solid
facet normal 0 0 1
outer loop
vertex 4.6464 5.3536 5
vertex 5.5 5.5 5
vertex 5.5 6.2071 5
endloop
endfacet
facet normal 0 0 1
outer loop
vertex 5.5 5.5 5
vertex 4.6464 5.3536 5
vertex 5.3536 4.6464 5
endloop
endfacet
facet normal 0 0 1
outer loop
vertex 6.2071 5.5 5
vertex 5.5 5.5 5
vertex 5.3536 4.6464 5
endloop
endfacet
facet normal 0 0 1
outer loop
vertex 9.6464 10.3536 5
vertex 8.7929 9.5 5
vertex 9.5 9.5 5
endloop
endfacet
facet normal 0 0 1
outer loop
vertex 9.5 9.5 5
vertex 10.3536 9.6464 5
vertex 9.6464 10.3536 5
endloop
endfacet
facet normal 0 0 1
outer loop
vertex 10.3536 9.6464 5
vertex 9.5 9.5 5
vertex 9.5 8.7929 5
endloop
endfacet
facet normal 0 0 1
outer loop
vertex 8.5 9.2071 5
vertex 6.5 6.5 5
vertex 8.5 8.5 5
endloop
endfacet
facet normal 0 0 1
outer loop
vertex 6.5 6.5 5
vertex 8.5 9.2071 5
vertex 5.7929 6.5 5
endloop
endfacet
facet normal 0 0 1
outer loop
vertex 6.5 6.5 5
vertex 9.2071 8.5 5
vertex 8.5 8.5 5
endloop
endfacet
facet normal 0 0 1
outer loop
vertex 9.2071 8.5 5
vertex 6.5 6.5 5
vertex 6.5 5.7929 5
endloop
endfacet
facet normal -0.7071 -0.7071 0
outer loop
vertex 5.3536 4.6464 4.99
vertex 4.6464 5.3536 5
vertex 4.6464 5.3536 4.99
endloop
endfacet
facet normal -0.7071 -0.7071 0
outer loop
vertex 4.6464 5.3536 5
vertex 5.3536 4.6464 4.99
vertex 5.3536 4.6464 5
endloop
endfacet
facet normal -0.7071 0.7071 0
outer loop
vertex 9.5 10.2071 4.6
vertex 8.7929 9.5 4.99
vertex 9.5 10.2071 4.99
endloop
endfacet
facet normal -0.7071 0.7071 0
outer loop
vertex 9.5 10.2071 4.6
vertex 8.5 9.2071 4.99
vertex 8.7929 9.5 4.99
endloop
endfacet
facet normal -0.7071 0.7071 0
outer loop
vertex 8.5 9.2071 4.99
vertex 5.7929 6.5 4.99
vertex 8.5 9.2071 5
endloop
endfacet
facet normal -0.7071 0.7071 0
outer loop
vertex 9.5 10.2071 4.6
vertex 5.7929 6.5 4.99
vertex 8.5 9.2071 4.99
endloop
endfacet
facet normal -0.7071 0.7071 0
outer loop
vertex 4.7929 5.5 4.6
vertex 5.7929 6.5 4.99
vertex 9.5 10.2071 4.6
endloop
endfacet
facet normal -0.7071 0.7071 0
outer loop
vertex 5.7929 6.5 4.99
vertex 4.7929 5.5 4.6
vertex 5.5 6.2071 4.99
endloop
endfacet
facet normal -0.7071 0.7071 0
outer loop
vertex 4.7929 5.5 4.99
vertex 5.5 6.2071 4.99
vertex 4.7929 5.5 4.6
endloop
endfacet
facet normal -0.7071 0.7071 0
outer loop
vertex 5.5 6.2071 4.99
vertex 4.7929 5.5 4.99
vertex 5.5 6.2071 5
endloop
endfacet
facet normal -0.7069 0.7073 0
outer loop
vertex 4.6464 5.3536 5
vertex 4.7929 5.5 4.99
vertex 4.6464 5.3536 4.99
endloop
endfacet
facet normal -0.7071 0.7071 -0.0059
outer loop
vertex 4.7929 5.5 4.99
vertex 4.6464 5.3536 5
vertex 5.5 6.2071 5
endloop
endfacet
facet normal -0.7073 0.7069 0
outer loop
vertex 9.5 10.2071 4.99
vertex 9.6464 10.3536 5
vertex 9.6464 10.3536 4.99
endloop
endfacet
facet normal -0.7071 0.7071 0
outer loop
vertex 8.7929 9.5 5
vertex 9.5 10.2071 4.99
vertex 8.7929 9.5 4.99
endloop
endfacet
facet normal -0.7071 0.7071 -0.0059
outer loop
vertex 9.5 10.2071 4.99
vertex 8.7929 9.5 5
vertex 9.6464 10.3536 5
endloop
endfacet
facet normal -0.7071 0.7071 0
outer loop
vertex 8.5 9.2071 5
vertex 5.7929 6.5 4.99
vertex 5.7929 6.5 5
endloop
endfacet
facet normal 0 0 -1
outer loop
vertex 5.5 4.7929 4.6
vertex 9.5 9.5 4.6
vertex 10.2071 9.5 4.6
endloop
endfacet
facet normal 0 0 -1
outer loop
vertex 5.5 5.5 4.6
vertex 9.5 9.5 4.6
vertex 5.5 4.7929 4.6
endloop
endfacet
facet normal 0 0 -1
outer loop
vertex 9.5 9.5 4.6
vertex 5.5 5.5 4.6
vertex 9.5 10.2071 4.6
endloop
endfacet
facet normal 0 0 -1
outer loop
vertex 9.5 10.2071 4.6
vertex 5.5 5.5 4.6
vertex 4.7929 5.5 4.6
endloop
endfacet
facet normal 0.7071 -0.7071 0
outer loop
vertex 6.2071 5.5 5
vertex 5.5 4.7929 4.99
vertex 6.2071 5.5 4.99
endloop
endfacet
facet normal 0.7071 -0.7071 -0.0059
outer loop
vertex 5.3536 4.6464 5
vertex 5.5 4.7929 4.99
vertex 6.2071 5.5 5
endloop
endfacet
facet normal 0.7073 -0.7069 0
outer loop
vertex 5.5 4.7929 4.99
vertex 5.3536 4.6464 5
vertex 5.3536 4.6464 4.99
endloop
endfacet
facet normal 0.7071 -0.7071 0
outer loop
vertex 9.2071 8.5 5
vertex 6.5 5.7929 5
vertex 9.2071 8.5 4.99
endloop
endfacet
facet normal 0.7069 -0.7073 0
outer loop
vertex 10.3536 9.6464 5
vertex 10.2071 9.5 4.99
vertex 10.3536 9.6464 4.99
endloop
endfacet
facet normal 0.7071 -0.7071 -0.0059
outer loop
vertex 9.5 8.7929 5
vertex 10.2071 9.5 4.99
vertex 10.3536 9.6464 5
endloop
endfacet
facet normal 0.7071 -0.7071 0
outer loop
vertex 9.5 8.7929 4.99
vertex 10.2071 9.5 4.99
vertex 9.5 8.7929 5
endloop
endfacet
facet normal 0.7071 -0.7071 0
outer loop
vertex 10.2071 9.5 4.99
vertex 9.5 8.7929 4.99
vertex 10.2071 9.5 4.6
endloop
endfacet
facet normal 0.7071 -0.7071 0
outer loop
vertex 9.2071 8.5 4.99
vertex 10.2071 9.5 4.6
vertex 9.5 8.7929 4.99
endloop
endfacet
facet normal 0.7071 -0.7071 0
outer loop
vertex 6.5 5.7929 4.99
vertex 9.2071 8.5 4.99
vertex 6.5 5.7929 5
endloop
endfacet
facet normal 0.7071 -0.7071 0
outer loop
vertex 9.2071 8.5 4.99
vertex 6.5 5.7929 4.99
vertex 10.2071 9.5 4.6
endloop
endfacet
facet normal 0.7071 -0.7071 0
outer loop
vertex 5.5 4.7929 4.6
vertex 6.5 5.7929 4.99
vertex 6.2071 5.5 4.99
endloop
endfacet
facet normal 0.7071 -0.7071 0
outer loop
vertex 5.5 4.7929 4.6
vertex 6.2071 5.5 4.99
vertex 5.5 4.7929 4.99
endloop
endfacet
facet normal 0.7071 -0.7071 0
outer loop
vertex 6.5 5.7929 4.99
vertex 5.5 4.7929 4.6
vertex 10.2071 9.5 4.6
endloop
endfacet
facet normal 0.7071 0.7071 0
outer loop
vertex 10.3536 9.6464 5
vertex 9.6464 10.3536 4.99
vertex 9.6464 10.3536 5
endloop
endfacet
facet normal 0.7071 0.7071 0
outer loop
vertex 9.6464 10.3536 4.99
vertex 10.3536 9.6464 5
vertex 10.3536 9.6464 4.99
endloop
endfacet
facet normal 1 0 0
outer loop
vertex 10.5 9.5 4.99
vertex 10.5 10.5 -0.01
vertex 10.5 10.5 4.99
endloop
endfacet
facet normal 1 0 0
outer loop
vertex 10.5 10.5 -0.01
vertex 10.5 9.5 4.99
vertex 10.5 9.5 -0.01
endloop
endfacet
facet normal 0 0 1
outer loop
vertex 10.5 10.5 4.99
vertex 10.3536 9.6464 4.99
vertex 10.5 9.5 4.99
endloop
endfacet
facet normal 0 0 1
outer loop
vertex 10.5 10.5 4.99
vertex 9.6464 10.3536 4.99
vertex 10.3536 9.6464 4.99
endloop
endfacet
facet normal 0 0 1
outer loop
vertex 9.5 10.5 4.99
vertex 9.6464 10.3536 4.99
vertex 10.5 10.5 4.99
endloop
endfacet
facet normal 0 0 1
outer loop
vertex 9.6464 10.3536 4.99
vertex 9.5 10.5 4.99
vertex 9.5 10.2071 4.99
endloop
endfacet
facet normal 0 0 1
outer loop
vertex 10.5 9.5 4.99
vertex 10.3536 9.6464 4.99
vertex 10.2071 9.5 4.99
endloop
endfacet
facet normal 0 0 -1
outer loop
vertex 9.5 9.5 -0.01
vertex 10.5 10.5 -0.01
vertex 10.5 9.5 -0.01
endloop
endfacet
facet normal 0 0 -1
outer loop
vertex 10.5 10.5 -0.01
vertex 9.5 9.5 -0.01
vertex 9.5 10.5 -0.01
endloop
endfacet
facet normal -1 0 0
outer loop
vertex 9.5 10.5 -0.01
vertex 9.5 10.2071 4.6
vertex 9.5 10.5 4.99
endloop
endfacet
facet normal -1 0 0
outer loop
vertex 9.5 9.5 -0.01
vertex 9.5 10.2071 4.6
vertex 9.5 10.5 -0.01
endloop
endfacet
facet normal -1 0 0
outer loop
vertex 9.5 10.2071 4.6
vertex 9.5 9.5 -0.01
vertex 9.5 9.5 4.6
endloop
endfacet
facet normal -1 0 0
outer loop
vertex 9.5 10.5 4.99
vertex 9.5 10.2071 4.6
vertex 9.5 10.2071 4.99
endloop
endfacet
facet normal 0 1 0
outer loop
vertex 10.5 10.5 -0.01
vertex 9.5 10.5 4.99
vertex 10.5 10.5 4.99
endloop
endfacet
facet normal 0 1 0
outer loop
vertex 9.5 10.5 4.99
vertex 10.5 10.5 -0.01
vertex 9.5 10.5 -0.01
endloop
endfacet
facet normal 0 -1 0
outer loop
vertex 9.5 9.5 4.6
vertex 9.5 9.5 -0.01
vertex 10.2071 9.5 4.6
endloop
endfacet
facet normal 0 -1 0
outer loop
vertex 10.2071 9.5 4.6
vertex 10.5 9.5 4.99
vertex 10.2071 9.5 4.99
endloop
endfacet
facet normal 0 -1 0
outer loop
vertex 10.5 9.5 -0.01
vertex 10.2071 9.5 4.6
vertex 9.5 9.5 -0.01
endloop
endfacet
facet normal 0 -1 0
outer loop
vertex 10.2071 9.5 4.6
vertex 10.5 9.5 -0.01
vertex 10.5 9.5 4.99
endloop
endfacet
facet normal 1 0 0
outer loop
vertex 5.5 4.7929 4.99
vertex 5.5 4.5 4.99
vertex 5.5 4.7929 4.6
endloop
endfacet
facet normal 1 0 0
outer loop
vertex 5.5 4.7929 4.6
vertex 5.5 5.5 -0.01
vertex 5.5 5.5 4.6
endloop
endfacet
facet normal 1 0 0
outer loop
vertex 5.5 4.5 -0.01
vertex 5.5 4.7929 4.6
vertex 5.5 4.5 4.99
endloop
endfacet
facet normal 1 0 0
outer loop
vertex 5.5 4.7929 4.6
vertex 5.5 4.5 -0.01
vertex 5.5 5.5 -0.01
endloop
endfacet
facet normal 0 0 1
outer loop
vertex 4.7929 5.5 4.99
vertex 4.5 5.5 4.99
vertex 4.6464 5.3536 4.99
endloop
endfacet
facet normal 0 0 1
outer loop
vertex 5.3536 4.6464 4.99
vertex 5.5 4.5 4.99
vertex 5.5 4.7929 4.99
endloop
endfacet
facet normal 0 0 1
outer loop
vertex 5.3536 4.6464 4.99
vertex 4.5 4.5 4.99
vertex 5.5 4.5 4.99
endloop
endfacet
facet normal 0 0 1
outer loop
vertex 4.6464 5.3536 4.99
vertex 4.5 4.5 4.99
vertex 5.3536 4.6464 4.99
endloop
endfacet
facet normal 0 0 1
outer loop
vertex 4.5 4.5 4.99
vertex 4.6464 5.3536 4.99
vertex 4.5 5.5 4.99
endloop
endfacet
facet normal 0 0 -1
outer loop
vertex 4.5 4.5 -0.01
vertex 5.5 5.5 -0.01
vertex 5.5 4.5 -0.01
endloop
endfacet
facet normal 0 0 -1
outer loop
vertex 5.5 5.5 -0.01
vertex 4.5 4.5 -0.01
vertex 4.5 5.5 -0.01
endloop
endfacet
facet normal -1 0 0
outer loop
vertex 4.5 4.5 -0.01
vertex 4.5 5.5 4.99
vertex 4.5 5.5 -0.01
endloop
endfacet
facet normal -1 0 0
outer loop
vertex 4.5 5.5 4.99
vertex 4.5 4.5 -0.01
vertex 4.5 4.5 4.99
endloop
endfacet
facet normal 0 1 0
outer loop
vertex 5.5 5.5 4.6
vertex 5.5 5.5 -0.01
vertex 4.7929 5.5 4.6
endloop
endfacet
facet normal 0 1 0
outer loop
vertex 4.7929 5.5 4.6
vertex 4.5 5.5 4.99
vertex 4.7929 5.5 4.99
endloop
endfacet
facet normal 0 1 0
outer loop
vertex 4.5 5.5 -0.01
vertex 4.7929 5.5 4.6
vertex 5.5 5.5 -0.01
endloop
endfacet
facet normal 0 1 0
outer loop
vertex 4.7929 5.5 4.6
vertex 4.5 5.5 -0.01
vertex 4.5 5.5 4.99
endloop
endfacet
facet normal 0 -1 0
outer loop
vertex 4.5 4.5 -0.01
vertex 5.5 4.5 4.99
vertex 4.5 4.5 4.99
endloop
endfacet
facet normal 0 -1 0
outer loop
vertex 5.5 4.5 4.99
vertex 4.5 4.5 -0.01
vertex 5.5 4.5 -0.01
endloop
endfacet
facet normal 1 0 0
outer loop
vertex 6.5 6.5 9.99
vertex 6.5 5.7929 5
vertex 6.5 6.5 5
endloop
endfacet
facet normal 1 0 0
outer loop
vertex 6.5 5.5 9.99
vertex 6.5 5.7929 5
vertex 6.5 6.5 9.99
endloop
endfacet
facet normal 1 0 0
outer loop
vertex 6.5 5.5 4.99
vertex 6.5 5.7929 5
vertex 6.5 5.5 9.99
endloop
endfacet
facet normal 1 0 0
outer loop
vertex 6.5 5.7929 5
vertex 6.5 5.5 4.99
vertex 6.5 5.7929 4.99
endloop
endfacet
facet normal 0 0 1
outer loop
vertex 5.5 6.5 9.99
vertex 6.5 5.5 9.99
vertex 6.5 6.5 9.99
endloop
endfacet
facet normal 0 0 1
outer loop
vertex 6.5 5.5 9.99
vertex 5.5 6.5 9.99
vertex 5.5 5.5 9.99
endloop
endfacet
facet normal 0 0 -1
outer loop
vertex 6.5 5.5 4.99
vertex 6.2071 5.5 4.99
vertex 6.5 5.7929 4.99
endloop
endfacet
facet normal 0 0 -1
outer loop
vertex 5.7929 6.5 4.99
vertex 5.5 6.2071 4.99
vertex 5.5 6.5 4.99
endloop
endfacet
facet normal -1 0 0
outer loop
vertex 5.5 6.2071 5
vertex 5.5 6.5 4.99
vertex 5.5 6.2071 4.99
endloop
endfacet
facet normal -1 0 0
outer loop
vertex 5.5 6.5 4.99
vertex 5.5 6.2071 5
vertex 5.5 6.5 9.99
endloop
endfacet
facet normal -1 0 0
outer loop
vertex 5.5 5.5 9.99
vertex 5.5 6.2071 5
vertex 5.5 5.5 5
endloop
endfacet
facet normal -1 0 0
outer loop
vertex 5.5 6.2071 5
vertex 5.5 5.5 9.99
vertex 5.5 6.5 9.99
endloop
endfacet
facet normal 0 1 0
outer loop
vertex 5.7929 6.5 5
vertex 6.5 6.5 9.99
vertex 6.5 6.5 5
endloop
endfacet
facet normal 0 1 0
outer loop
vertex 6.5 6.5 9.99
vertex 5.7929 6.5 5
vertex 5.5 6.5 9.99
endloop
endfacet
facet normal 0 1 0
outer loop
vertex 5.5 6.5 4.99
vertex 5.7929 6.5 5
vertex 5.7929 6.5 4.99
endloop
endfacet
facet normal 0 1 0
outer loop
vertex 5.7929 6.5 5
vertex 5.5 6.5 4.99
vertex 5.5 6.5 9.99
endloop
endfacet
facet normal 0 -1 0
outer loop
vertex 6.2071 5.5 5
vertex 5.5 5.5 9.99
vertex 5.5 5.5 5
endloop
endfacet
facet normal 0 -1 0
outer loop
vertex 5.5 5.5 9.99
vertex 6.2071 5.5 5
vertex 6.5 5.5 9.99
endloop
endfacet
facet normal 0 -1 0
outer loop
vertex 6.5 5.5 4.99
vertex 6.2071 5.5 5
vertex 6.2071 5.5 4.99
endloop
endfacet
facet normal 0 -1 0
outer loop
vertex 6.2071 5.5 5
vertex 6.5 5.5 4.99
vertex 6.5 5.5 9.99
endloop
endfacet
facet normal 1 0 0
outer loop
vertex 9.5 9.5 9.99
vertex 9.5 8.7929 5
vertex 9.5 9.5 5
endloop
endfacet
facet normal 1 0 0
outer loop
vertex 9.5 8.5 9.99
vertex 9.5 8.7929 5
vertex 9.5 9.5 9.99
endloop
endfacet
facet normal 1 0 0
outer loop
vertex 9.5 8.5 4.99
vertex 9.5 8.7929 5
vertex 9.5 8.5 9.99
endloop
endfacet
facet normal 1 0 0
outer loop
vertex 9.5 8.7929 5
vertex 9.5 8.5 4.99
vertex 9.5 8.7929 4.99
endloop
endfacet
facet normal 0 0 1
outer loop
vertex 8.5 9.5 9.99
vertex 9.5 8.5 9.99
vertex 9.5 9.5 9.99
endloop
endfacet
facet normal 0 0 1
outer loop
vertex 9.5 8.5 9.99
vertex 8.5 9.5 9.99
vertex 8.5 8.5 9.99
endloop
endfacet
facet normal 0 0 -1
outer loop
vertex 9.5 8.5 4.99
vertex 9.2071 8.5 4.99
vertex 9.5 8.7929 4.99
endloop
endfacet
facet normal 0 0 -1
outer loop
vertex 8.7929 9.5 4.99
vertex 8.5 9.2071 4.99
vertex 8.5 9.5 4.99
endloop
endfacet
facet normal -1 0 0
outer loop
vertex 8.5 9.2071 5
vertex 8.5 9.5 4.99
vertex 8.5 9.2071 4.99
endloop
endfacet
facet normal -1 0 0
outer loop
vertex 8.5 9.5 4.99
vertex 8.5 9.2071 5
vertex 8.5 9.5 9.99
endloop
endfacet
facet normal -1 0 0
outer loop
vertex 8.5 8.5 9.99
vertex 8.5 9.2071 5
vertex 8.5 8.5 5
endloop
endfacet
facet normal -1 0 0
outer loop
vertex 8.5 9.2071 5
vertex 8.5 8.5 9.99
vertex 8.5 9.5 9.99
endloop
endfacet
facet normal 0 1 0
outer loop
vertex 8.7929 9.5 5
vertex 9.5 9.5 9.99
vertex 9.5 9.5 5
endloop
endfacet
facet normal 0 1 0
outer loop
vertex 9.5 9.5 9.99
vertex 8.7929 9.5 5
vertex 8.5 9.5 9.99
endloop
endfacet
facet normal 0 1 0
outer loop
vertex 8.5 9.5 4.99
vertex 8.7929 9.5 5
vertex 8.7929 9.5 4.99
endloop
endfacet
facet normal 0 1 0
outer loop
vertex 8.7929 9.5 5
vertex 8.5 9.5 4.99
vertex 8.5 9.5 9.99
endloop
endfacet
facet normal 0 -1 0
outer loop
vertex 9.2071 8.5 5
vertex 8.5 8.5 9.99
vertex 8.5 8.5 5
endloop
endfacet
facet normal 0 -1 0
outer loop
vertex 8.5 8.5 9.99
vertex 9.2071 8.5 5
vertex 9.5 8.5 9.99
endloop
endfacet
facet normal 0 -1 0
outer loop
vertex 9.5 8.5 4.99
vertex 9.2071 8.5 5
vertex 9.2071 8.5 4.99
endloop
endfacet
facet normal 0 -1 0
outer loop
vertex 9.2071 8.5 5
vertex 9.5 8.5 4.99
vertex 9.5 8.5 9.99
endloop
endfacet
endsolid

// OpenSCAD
epsilon = 0.01;
layer_height = .2; //in mm
bridge_height = 2*layer_height;
extrusion_width = .5; //in mm
bridge_width = 2 * extrusion_width;
bridge_height_above_0 = 5.0;

x1 = 5.0;
y1 = 5.0;

x2 = 10.0;
y2 = 10.0;

pillar_x = 4.0;
pillar_y = 6.0;
pillar_z1 = 2.0;
pillar_z2 = 10.0;

//function pillar_height(pillar_z2, pillar_z1) = pillar_z2-pillar_z1;
pillar_height_above_0 = 10.0;
pillar_lw = 1.0;

function distance(x1, y1, x2, y2) = sqrt(pow (x2 - x1, 2) + pow(y2 - y1, 2));

bridge_length = distance(x1, y1, x2, y2);
//echo (distance(x1, y1, x2, y2));

module bridge_platform(distance)
{
    translate([0, -bridge_width/2, -bridge_height])
    cube([bridge_length, bridge_width, bridge_height]);
}
//bridge_platform();

module bridge_pillar(pillar_height)
{
    //cube([pillar_lw, pillar_lw, pillar_height(pillar_z2, pillar_z1)], center = true);
    cube([pillar_lw, pillar_lw, pillar_height], center = true);
}

module sample_bridge1()
{
    //translate so that endpt1 of bridge is at x1, y1
    //works because we don't use center = true on the bridge_platform module
    translate([x1, y1, 0])
    //translate so that bottom of bridge is at height of x1, y1
    translate([0, 0, bridge_height_above_0])
    //rotate so that endpt2 of bridge is at x2, y2
    rotate([0, 0, atan2(y2, x2)])
    bridge_platform(bridge_length);
    //echo (atan2(y2, x2));
}
sample_bridge1();

pillar1_x = 10.0;
pillar1_y = 10.0;
pillar1_z1 = 0.0;
pillar1_z2 = 5.0;
pillar1_height = pillar1_z2 - pillar1_z1;
pillar1_height_above_0 = 0.0;
module sample_pillar1()
{
    //translate so that the 'center' of the pillar is at x1, y1
    //and bottom of pillar is at pillar_height_above_0
    //translate([pillar2_x, pillar2_y, pillar_height(pillar2_z2, pillar2_z1)/2 +pillar2_height_above_0])
    translate([pillar1_x, pillar1_y, 0])
    translate([0, 0, (pillar1_height)/2++pillar1_height_above_0-epsilon])
    bridge_pillar(pillar1_height);
}
sample_pillar1();

pillar2_x = 5.0;
pillar2_y = 5.0;
pillar2_z1 = 0.0;
pillar2_z2 = 5.0;
pillar2_height = pillar2_z2 - pillar2_z1;
pillar2_height_above_0 = 0.0;
module sample_pillar2()
{
    //translate so that the 'center' of the pillar is at x1, y1
    //and bottom of pillar is at pillar_height_above_0
    //translate([pillar2_x, pillar2_y, pillar_height(pillar2_z2, pillar2_z1)/2 +pillar2_height_above_0])
    translate([pillar2_x, pillar2_y, 0])
    translate([0, 0, (pillar2_height)/2++pillar2_height_above_0-epsilon])
    bridge_pillar(pillar2_height);
}
sample_pillar2();

pillar3_x = 6.0;
pillar3_y = 6.0;
pillar3_z1 = 0.0;
pillar3_z2 = 5.0;
pillar3_height = pillar3_z2 - pillar3_z1;
pillar3_height_above_0 = 5.0;
module sample_pillar3()
{
    //translate so that the 'center' of the pillar is at x1, y1
    //and bottom of pillar is at pillar_height_above_0
    //translate([pillar2_x, pillar2_y, pillar_height(pillar2_z2, pillar2_z1)/2 +pillar2_height_above_0])
    translate([pillar3_x, pillar3_y, 0])
    translate([0, 0, (pillar3_height)/2+pillar3_height_above_0-epsilon])
    bridge_pillar(pillar3_height);
}
sample_pillar3();

pillar4_x = 9.0;
pillar4_y = 9.0;
pillar4_z1 = 0.0;
pillar4_z2 = 5.0;
pillar4_height = pillar4_z2 - pillar4_z1;
pillar4_height_above_0 = 5.0;
module sample_pillar4()
{
    //translate so that the 'center' of the pillar is at x1, y1
    //and bottom of pillar is at pillar_height_above_0
    //translate([pillar2_x, pillar2_y, pillar_height(pillar2_z2, pillar2_z1)/2 +pillar2_height_above_0])
    translate([pillar4_x, pillar4_y, 0])
    translate([0, 0, (pillar4_height)/2+pillar4_height_above_0-epsilon])
    bridge_pillar(pillar4_height);
}
sample_pillar4();

module test_cube()
{
    translate([5/2, 5/2, 5/2])
    cube(5, center = true);
}
//test_cube();
